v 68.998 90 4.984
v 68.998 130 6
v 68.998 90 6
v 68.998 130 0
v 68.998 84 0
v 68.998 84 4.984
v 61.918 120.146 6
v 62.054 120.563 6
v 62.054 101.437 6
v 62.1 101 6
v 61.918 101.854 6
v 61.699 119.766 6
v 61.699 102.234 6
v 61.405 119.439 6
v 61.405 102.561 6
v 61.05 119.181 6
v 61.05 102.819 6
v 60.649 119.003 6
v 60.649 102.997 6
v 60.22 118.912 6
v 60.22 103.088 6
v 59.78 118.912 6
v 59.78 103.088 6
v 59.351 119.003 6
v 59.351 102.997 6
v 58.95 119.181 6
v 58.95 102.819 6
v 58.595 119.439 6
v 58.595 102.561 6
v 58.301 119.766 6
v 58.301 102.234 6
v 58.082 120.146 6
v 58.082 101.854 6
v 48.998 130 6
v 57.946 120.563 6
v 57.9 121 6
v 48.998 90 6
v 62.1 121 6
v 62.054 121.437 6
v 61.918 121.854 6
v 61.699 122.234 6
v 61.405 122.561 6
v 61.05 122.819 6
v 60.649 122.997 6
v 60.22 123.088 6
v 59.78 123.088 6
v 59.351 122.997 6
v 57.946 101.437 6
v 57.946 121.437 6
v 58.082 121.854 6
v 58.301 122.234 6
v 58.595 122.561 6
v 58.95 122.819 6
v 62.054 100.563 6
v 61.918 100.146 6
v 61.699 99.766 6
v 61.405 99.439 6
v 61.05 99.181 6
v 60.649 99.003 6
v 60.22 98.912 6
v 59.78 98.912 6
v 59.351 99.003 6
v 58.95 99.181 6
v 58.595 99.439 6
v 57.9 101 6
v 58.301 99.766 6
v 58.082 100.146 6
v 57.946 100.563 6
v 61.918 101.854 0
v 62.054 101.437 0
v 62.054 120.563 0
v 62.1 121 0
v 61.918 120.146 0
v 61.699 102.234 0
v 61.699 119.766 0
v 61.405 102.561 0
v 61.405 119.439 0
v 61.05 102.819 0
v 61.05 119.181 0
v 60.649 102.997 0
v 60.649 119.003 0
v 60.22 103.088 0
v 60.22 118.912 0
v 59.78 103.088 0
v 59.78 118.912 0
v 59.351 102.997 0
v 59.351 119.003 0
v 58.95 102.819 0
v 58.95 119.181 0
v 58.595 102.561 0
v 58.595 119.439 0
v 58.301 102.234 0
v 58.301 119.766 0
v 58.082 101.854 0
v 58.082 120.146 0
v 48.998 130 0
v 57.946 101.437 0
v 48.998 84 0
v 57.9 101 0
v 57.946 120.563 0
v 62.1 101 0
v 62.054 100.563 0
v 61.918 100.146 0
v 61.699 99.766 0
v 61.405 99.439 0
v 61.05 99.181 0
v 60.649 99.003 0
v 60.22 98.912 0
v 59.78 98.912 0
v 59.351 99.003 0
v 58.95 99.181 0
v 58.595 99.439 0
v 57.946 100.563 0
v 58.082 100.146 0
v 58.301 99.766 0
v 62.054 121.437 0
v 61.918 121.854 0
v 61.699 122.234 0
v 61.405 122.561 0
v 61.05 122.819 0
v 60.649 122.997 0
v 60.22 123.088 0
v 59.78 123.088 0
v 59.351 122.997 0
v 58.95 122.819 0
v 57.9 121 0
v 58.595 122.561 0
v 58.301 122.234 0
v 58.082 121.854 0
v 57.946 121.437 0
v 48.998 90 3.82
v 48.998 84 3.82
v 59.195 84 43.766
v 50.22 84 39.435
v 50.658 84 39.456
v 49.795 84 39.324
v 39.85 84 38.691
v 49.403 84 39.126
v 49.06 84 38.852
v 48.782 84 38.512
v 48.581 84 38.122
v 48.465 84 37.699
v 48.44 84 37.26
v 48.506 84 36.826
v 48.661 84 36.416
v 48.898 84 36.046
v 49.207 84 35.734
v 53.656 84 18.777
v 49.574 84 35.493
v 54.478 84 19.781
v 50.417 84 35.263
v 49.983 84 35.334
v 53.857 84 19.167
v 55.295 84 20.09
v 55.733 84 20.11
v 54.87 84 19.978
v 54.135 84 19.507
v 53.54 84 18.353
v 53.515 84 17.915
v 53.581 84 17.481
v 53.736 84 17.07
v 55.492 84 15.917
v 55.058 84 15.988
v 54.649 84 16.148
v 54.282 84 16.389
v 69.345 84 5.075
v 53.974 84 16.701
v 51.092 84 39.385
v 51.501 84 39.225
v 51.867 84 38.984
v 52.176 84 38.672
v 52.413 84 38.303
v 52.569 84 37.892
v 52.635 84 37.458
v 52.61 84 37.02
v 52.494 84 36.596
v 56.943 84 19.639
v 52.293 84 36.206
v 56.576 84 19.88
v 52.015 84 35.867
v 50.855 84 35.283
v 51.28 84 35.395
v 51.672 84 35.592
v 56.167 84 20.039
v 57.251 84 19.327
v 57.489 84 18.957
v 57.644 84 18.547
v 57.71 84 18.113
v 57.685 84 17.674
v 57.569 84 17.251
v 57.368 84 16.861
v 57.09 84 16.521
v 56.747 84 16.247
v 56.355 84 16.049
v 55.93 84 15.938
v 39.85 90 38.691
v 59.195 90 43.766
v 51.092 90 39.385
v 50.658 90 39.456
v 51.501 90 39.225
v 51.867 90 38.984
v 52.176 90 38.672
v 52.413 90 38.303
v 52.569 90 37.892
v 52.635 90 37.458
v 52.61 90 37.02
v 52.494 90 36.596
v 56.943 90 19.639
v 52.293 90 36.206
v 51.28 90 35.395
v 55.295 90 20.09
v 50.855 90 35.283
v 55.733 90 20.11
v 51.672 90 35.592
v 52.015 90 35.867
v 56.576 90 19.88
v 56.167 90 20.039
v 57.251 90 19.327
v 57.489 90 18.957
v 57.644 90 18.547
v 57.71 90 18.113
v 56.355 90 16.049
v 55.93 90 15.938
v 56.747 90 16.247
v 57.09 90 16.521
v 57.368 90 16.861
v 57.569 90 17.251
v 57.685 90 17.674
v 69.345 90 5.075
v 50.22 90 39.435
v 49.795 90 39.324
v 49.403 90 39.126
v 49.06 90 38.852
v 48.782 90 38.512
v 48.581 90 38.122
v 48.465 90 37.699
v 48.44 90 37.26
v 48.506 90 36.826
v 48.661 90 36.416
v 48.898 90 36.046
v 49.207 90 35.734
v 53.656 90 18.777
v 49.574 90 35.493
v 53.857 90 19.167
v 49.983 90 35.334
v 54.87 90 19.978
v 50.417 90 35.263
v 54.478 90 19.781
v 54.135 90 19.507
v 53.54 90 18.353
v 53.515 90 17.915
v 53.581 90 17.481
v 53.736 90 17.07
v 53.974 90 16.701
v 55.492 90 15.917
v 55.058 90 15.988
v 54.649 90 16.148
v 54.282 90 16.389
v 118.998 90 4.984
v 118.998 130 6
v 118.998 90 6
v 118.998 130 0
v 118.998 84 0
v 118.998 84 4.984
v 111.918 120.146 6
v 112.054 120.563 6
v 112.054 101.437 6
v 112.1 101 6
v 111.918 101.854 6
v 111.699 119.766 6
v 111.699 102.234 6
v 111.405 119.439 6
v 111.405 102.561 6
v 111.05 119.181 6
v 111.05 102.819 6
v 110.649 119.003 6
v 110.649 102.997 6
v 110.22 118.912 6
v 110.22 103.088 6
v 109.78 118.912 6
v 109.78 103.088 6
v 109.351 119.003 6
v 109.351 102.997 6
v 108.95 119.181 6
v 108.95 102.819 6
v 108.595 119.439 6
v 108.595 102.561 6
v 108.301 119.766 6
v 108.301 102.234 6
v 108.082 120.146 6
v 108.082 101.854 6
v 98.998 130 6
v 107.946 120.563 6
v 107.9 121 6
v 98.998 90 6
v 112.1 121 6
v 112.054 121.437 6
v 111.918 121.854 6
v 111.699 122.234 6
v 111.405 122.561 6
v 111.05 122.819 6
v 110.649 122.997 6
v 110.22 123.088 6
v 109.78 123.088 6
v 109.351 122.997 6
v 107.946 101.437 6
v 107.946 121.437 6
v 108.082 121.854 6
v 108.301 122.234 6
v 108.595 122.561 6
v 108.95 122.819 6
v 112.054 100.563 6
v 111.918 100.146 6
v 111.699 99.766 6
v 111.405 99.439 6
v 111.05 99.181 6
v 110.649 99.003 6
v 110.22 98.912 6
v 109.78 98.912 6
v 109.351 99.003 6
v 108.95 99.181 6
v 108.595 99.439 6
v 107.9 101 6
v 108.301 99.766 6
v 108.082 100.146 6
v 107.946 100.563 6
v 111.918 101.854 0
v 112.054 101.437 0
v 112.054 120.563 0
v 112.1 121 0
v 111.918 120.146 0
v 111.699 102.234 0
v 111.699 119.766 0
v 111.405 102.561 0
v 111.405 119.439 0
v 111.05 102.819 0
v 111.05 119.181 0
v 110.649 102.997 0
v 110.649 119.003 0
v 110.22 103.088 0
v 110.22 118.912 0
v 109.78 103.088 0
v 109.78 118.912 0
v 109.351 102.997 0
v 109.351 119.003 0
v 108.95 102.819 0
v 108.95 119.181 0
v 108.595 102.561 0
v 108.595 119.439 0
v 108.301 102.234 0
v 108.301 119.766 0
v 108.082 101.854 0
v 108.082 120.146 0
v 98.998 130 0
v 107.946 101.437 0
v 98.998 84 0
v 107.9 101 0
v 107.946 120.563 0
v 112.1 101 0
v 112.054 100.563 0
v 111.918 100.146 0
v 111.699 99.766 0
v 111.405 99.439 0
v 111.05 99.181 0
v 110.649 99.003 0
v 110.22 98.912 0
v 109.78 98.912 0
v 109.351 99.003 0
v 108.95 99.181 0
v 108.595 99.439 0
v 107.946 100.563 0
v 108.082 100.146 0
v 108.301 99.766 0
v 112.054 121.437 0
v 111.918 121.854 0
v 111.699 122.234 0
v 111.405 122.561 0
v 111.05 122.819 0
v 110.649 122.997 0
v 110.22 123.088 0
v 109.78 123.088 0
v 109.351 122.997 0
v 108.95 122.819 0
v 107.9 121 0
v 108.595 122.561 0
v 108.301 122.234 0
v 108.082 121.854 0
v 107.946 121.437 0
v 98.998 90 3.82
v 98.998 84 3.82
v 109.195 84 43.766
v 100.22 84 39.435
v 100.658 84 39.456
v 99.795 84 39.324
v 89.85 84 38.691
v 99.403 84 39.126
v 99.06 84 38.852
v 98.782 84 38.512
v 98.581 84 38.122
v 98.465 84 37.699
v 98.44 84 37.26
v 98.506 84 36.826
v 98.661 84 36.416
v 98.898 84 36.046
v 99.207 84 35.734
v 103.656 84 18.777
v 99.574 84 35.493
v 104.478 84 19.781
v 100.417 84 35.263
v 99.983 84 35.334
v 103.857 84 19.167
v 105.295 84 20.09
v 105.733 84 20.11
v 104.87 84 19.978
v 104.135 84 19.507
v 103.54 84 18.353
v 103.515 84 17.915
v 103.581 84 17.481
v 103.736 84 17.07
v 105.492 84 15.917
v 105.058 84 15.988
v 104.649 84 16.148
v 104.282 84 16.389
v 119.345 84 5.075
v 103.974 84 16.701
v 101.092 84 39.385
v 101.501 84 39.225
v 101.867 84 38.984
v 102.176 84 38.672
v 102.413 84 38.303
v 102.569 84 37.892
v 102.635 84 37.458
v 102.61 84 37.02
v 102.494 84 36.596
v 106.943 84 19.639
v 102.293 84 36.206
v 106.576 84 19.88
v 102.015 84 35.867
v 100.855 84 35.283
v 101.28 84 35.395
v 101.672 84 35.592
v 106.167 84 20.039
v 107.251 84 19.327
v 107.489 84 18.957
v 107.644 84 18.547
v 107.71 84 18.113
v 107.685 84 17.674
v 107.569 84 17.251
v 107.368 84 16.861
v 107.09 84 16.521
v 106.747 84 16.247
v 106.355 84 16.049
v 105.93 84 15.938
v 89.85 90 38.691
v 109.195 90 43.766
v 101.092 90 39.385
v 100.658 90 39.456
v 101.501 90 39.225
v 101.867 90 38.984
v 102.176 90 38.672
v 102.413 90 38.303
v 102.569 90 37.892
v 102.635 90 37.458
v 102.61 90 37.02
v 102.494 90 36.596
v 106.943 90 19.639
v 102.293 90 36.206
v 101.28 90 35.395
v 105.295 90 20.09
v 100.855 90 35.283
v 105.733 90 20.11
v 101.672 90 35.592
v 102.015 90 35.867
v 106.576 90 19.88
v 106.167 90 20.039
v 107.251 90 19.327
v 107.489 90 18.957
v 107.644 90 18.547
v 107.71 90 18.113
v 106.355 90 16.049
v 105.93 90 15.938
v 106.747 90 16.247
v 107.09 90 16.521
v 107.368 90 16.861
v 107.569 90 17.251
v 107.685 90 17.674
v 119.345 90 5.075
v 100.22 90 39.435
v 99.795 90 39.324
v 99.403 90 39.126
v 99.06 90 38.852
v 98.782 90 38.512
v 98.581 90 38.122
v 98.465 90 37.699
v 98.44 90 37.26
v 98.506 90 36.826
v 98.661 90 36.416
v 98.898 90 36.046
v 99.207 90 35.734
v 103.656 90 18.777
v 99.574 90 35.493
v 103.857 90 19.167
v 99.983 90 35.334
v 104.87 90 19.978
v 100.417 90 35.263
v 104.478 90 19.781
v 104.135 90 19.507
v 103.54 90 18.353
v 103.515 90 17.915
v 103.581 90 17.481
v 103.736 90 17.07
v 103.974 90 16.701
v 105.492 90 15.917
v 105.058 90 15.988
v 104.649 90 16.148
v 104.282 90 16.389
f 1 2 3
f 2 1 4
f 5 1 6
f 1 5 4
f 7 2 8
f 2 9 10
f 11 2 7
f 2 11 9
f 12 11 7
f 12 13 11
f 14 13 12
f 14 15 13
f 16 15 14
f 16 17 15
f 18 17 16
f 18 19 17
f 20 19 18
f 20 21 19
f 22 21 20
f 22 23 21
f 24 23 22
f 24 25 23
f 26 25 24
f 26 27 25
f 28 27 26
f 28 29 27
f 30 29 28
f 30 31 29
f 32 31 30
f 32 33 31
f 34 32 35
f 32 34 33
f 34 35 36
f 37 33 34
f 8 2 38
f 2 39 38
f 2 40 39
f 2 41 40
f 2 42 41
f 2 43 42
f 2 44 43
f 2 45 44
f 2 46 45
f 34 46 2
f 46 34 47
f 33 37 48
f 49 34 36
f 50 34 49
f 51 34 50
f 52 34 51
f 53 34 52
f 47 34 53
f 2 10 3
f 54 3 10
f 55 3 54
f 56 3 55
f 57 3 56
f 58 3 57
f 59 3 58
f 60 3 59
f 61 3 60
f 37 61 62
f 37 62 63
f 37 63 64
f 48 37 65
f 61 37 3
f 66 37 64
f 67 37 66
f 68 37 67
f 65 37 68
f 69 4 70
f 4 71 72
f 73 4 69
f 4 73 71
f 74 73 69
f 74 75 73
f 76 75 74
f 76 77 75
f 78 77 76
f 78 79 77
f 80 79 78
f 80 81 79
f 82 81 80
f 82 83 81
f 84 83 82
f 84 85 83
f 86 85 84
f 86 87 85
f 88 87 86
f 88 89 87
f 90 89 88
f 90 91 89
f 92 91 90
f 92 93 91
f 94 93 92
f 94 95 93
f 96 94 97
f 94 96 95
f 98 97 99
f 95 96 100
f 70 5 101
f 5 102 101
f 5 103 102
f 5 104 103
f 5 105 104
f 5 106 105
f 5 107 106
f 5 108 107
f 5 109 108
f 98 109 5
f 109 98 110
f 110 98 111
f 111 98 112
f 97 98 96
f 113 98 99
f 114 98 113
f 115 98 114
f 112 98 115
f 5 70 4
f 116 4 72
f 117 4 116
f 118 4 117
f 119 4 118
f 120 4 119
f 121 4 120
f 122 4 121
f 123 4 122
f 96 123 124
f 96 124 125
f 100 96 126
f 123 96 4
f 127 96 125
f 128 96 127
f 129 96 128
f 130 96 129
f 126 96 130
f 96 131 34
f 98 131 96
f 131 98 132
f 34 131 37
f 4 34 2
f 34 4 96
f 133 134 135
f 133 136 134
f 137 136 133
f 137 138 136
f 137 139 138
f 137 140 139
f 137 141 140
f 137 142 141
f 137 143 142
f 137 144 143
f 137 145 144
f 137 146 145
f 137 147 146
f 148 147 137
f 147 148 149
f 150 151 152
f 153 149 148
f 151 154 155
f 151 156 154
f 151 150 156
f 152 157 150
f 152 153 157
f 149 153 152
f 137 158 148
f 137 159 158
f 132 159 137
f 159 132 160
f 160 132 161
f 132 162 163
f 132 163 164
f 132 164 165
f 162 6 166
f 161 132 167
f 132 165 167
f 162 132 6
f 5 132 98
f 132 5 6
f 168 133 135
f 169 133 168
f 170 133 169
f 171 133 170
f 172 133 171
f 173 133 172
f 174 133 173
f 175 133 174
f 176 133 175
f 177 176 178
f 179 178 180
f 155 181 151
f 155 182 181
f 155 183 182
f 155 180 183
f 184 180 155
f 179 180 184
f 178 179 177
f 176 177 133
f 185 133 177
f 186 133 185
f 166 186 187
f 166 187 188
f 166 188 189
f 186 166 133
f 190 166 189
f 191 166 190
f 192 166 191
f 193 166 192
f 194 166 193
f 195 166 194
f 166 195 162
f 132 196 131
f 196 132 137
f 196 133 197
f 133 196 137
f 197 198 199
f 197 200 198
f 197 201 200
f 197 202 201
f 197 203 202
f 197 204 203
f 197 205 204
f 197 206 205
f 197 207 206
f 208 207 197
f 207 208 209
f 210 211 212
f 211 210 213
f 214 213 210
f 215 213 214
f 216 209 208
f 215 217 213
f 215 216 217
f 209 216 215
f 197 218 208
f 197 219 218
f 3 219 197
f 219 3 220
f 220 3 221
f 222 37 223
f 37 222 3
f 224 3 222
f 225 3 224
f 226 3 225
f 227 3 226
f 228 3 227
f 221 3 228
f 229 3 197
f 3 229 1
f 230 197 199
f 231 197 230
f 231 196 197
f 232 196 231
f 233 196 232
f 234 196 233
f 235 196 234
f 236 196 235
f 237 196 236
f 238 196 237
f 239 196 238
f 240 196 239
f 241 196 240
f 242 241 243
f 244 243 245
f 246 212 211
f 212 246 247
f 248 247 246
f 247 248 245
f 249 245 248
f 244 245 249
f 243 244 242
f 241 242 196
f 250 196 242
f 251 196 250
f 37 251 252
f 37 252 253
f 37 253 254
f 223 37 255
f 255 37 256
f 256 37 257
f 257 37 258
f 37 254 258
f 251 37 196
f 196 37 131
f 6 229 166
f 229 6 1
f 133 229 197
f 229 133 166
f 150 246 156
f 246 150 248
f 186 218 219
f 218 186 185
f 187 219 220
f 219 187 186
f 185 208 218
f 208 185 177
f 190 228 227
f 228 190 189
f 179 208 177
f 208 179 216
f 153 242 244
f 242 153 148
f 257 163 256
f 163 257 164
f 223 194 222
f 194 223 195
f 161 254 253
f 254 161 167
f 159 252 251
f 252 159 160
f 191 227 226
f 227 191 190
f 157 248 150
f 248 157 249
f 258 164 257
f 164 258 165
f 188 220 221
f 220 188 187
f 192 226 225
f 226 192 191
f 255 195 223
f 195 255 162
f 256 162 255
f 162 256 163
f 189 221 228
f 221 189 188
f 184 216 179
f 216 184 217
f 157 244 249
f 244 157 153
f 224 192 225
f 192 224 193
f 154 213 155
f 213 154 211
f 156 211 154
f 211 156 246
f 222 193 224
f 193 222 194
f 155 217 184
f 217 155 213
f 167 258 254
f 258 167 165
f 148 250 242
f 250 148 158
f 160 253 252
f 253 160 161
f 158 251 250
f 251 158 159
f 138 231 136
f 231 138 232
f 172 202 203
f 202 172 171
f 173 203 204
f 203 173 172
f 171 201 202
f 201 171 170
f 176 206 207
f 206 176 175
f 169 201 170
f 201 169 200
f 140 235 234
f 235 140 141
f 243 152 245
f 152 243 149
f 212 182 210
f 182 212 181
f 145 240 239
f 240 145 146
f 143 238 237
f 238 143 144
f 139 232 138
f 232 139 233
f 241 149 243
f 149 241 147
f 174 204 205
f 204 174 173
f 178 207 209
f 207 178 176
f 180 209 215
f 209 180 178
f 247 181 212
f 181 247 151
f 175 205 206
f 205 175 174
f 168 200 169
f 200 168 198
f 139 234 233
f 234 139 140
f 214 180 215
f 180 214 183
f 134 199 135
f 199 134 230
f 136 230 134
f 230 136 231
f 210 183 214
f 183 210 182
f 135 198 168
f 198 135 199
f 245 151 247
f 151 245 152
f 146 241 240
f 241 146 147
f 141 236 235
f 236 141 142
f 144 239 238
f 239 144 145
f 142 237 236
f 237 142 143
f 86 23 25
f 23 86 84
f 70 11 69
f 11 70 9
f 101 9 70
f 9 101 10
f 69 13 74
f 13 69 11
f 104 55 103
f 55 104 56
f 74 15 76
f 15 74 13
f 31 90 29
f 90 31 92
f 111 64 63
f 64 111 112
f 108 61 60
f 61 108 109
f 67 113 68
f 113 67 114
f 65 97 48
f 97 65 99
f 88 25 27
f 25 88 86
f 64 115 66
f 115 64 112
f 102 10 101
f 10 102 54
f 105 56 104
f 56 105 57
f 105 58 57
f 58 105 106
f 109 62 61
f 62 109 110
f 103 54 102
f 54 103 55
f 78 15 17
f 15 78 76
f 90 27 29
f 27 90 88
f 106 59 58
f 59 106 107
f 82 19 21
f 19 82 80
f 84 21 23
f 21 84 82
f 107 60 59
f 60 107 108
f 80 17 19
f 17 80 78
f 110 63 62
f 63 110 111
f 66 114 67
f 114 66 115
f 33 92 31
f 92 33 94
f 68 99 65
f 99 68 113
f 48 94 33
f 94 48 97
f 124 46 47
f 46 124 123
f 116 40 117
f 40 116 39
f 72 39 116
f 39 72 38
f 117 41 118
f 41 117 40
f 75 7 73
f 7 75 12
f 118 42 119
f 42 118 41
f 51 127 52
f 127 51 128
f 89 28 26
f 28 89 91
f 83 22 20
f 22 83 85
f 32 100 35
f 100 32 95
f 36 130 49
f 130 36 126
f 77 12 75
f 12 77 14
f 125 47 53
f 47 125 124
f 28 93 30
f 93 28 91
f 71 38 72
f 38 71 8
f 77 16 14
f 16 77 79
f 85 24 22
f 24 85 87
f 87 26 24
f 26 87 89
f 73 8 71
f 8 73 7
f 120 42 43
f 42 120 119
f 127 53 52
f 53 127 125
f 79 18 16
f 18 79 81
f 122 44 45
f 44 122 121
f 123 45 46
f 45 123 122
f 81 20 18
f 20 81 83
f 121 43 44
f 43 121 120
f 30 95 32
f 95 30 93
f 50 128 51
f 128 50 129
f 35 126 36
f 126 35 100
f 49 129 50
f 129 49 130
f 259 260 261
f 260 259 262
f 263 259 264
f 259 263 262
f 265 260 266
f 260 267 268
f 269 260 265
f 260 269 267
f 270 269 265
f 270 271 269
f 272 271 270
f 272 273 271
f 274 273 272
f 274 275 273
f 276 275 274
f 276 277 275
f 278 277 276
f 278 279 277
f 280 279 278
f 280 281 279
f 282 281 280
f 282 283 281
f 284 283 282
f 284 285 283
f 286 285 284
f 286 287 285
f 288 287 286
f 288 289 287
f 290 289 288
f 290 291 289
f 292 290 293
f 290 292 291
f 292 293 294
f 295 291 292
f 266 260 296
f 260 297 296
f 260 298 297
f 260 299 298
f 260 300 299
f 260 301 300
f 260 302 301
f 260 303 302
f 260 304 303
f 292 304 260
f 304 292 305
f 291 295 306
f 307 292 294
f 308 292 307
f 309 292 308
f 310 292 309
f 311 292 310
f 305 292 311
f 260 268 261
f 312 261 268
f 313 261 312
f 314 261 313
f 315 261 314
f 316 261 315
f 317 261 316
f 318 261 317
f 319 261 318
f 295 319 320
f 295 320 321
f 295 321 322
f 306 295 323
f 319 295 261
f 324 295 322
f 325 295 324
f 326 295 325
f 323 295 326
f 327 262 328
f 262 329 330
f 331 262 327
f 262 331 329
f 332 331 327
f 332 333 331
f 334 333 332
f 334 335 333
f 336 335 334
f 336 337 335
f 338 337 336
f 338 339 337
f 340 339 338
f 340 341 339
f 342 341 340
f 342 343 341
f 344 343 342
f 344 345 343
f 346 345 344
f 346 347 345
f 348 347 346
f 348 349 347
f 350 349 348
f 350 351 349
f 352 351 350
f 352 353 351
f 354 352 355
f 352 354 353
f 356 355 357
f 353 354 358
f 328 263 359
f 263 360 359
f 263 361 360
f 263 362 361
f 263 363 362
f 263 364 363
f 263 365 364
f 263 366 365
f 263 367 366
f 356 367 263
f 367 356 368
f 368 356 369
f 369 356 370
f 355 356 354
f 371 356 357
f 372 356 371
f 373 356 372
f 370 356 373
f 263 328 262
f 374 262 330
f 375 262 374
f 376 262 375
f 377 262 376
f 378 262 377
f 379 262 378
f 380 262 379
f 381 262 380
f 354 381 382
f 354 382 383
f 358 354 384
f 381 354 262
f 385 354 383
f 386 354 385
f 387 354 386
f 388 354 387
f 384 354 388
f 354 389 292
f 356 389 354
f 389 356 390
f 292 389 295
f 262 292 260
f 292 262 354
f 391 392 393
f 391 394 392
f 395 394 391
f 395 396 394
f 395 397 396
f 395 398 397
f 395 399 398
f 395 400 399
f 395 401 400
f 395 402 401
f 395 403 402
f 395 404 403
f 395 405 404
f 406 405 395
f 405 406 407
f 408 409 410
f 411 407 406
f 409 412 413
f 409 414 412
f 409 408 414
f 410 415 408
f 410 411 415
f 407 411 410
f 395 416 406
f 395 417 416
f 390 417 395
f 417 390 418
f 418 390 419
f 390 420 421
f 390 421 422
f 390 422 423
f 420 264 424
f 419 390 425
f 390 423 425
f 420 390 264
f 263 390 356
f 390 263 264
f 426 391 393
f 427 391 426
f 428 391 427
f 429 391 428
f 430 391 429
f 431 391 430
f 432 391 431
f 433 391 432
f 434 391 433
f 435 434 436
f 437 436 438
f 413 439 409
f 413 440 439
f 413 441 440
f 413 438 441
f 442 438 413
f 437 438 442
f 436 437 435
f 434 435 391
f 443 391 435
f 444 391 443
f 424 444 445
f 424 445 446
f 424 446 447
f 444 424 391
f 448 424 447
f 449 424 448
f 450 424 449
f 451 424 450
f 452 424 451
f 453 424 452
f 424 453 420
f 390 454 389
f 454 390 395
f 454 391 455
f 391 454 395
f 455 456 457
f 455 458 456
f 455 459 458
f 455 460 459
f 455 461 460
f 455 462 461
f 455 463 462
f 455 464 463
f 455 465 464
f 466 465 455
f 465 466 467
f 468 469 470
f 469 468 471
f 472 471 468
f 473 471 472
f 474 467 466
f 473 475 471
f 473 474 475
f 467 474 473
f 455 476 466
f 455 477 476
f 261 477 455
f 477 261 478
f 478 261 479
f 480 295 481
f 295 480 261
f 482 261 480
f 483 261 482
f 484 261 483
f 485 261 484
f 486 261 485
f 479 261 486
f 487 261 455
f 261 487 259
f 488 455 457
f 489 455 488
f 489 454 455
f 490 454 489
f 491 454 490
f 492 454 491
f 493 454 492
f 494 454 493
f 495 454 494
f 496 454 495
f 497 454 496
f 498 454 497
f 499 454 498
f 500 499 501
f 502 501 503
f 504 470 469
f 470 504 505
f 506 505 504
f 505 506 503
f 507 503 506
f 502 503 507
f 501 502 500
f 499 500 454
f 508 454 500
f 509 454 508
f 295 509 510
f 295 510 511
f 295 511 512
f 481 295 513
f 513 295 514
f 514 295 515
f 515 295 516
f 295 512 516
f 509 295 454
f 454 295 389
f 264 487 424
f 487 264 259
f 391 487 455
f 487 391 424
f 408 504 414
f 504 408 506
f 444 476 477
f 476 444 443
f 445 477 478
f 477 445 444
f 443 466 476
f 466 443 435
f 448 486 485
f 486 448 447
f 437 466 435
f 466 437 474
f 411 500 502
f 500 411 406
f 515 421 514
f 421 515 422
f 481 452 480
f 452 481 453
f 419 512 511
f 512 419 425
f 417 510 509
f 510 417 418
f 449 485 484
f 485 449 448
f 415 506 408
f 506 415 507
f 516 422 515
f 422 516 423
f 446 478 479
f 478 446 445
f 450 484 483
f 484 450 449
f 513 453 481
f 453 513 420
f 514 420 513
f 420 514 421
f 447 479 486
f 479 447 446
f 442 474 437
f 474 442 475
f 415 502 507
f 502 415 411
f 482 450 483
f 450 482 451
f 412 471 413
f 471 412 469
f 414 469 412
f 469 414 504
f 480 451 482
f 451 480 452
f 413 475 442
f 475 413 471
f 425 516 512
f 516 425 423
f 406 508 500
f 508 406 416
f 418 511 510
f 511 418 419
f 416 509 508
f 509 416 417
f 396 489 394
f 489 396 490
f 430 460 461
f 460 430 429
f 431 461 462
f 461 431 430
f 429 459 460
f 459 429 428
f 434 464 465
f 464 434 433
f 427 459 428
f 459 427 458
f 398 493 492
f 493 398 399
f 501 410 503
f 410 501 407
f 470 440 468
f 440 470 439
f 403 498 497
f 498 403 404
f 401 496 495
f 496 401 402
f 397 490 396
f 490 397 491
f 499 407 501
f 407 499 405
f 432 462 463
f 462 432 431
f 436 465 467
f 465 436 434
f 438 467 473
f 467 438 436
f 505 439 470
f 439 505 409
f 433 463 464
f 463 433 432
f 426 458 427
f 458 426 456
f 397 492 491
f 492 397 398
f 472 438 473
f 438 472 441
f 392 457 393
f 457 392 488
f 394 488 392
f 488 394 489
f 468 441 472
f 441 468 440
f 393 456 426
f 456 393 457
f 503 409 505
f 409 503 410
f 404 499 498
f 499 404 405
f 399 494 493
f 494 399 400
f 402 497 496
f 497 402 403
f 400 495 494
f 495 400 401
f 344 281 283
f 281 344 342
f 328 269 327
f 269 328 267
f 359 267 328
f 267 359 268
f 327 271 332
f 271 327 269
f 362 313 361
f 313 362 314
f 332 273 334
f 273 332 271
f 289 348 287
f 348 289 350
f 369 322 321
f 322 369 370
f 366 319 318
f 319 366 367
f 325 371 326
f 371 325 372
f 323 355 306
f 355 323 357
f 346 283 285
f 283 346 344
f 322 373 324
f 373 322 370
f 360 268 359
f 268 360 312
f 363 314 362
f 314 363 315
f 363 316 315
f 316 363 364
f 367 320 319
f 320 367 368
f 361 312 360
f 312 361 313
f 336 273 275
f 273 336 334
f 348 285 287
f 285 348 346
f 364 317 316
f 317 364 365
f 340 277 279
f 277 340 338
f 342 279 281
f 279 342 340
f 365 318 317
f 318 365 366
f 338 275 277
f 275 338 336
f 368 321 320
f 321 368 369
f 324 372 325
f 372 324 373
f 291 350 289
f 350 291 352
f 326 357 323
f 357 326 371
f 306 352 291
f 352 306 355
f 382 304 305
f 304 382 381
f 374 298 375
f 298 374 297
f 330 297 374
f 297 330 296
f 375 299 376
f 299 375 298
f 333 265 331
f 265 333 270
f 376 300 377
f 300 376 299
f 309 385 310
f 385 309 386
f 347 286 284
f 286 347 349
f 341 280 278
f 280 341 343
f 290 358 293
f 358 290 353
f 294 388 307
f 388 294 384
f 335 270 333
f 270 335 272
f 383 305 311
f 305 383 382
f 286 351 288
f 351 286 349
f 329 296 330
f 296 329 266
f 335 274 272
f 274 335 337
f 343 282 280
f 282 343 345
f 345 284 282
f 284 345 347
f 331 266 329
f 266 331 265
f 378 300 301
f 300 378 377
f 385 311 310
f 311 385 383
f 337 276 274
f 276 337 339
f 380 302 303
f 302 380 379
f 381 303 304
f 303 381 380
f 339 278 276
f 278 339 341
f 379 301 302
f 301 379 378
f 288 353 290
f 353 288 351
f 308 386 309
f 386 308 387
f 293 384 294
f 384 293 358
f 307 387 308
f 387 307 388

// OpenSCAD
// file: ../functions.scad
// PRUSA Mendel  
// Functions used in many files
// GNU GPL v2
// Josef Průša
// josefprusa@me.com
// prusadjs.cz
// http://www.reprap.org/wiki/Prusa_Mendel
// http://github.com/prusajr/PrusaMendel

module nut(d,h,horizontal=true){
cornerdiameter =  (d / 2) / cos (180 / 6);
cylinder(h = h, r = cornerdiameter, $fn = 6);
if(horizontal){
for(i = [1:6]){
	rotate([0,0,60*i]) translate([-cornerdiameter-0.2,0,0]) rotate([0,0,-45]) cube(size = [2,2,h]);
}}
}

// By nophead
module polyhole(d,h) {
    n = max(round(2 * d),3);
    rotate([0,0,180])
        cylinder(h = h, r = (d / 2) / cos (180 / n), $fn = n);
}

module roundcorner(diameter){
	difference(){
		cube(size = [diameter,diameter,99], center = false);
		translate(v = [diameter, diameter, 0]) cylinder(h = 100, r=diameter, center=true);
	}
}
// file: ../metric.scad
// PRUSA Mendel  
// Default metric sizes
// GNU GPL v2
// Josef Průša
// josefprusa@me.com
// prusadjs.cz
// http://www.reprap.org/wiki/Prusa_Mendel
// http://github.com/prusajr/PrusaMendel

// DONT CHANGE THIS FILE! ALTER VALUES IN CONFIGURATION.SCAD INSTEAD

// RODS

threaded_rod_diameter = 8;
threaded_rod_diameter_horizontal = 8;
smooth_bar_diameter = 8;
smooth_bar_diameter_horizontal = 8;

// Nuts and bolts

m8_diameter = 8;
m8_nut_diameter = 14.5;

m4_diameter = 4;
m4_nut_diameter = 7.5;

m3_diameter = 3;
m3_nut_diameter = 5;

// Bushing holder

bushing_core_diameter = smooth_bar_diameter;
bushing_material_thickness = 1;

// Motors

motor_shaft = 5.1;
// file: ../configuration.scad
// PRUSA Mendel  
// Configuration file
// GNU GPL v2
// Josef Průša
// josefprusa@me.com
// prusadjs.cz
// http://www.reprap.org/wiki/Prusa_Mendel
// http://github.com/prusajr/PrusaMendel

// PLEASE SELECT ONE OF THE CONFIGURATIONS BELOW
// BY UN-COMMENTING IT

// Uncomment for metric settings
// METRIC METRIC METRIC METRIC METRIC METRIC METRIC METRIC 

include <metric.scad>;

// Uncomment for imperial settings
// IMPERIAL IMPERIAL IMPERIAL IMPERIAL IMPERIAL IMPERIAL IMPERIAL 

//include <sae.scad>;

//thin_wall = 3;
// LM8UU
//linear = false;

// override settings by customizing below
// CUSTOM CUSTOM CUSTOM CUSTOM CUSTOM CUSTOM CUSTOM CUSTOM CUSTOM

threaded_rod_diameter = 8.2;
threaded_rod_diameter_horizontal = 8.2;
smooth_bar_diameter = 8.3;
smooth_bar_diameter_horizontal = 8.3;

// Nuts and bolts

m8_diameter = 8.3;
m8_nut_diameter = 15;

m4_diameter = 4.2;
m4_nut_diameter = 9;

m3_diameter = 3.3;
m3_nut_diameter = 5.8;

///counted stuff
m3_nut_diameter_bigger = ((m3_nut_diameter  / 2) / cos (180 / 6))*2;

// functions 
include <functions.scad>
// file: ../60-inside-top.scad
// F. Beachler, Longevity Software LLC. d.b.a. Terawatt Industries

include <configuration.scad>;

thickness = 6;   // wall and base thickness
slottabs = 2;    // Slot depth (2 is normal) -1 to remove tabs
holes = m4_diameter;  //m3, m4 or m5=5.1
o = 0.01;						// overlap amount for error-free STLs

$fn=30;

for (x = [0])
{
//	translate([(x*25), 0, 0]) rotate([90, 0, 0]) prism60inside_top_armor(thickness, slottabs, holes, false);
	translate([25, 20, 0]) rotate([90, 0, 0]) mirror([1, 0, 0]) prism60inside_top_armor(thickness, slottabs, holes, false);
}

module prism60inside_top(th = thickness, st = slottabs, hs = holes)
{
	difference() {
		union() {
			translate([-6 * sin(14.5) + 0.5, -6, 0]) cube([20, 40 + 6, 6]);
			rotate([90, -14.7, 0]) cube([20, 40, 6]);
		}
		translate([10, 5 + th, -o]) cylinder(r=hs / 2,h=th + 2*o);
		translate([10, 25 + th, -o]) cylinder(r=hs / 2,h=th + 2*o);
		rotate([90, -14.7, 0]) {
			translate([10, 10 + th, -o]) cylinder(r=hs / 2,h=th + 2*o);
			translate([10, 30 + th, -o]) cylinder(r=hs / 2,h=th + 2*o);
		}
	}
}

module prism60inside_top_armor(th = thickness, st = slottabs, hs = holes, supp = false)
{
	difference() {
		union() {
			translate([-6 * cos(90 - 14.7 / 2) - 0.1, 0, 0]) cube([45 + 6 * cos(90 - 14.7), 20, 6]);
			translate([-20, 0, 20 * sin(16.7)]) {
				rotate([0, 16.7, 0]) {
					difference() {
						cube([20, 20 + 45, 6]);
						translate([10, 25 + th, -5]) cylinder(r=hs / 2,h = 20 + 2*o);
						translate([10, 45 + th, -5]) cylinder(r=hs / 2,h = 20 + 2*o);
					}
				}
			}
			difference() {
				translate([-6 * cos(90 - 16.7 / 2) - 0.1, 20, 0]) cube([20, 20, 6]);
				translate([27.5, 47.5 - o, -o]) cylinder(r=30,h=10 + 2*o);
			}
		}
		translate([15, 5 + th, -o]) cylinder(r=hs / 2,h=th + 2*o);
		translate([35, 5 + th, -o]) cylinder(r=hs / 2,h=th + 2*o);
	}
	if (supp) {
		for (x = [0, 5, 10, 15, 20, 25, 30, 35, 40, 45, 50, 55, 60, 63]) {
			translate([-20, x, -0.1]) cube([19, 1, 5]);
		}
	}
}
// file: heatbed.scad
// F. Beachler, Longevity Software LLC. d.b.a. Terawatt Industries

include <../configuration.scad>;

$fn=50;
height = 200;
width = 200;
depth = 3;

heatbed(height, width, depth);

module heatbed(h = height, w = width, t = depth) {
	color([255, 0, 0]) cube([h, w, t]);
}
// main file
// F. Beachler, Longevity Software LLC. d.b.a. Terawatt Industries

use <heatbed.scad>;
use <../60-inside-top.scad>;

$fn=50;

% translate([0, 0, -3]) heatbed();
plate1();

module plate1() {
	for (x = [0, 1]) {
		translate([50 + (x*50), 90, 0]) prism60inside_top(th = 6);
	}
}
